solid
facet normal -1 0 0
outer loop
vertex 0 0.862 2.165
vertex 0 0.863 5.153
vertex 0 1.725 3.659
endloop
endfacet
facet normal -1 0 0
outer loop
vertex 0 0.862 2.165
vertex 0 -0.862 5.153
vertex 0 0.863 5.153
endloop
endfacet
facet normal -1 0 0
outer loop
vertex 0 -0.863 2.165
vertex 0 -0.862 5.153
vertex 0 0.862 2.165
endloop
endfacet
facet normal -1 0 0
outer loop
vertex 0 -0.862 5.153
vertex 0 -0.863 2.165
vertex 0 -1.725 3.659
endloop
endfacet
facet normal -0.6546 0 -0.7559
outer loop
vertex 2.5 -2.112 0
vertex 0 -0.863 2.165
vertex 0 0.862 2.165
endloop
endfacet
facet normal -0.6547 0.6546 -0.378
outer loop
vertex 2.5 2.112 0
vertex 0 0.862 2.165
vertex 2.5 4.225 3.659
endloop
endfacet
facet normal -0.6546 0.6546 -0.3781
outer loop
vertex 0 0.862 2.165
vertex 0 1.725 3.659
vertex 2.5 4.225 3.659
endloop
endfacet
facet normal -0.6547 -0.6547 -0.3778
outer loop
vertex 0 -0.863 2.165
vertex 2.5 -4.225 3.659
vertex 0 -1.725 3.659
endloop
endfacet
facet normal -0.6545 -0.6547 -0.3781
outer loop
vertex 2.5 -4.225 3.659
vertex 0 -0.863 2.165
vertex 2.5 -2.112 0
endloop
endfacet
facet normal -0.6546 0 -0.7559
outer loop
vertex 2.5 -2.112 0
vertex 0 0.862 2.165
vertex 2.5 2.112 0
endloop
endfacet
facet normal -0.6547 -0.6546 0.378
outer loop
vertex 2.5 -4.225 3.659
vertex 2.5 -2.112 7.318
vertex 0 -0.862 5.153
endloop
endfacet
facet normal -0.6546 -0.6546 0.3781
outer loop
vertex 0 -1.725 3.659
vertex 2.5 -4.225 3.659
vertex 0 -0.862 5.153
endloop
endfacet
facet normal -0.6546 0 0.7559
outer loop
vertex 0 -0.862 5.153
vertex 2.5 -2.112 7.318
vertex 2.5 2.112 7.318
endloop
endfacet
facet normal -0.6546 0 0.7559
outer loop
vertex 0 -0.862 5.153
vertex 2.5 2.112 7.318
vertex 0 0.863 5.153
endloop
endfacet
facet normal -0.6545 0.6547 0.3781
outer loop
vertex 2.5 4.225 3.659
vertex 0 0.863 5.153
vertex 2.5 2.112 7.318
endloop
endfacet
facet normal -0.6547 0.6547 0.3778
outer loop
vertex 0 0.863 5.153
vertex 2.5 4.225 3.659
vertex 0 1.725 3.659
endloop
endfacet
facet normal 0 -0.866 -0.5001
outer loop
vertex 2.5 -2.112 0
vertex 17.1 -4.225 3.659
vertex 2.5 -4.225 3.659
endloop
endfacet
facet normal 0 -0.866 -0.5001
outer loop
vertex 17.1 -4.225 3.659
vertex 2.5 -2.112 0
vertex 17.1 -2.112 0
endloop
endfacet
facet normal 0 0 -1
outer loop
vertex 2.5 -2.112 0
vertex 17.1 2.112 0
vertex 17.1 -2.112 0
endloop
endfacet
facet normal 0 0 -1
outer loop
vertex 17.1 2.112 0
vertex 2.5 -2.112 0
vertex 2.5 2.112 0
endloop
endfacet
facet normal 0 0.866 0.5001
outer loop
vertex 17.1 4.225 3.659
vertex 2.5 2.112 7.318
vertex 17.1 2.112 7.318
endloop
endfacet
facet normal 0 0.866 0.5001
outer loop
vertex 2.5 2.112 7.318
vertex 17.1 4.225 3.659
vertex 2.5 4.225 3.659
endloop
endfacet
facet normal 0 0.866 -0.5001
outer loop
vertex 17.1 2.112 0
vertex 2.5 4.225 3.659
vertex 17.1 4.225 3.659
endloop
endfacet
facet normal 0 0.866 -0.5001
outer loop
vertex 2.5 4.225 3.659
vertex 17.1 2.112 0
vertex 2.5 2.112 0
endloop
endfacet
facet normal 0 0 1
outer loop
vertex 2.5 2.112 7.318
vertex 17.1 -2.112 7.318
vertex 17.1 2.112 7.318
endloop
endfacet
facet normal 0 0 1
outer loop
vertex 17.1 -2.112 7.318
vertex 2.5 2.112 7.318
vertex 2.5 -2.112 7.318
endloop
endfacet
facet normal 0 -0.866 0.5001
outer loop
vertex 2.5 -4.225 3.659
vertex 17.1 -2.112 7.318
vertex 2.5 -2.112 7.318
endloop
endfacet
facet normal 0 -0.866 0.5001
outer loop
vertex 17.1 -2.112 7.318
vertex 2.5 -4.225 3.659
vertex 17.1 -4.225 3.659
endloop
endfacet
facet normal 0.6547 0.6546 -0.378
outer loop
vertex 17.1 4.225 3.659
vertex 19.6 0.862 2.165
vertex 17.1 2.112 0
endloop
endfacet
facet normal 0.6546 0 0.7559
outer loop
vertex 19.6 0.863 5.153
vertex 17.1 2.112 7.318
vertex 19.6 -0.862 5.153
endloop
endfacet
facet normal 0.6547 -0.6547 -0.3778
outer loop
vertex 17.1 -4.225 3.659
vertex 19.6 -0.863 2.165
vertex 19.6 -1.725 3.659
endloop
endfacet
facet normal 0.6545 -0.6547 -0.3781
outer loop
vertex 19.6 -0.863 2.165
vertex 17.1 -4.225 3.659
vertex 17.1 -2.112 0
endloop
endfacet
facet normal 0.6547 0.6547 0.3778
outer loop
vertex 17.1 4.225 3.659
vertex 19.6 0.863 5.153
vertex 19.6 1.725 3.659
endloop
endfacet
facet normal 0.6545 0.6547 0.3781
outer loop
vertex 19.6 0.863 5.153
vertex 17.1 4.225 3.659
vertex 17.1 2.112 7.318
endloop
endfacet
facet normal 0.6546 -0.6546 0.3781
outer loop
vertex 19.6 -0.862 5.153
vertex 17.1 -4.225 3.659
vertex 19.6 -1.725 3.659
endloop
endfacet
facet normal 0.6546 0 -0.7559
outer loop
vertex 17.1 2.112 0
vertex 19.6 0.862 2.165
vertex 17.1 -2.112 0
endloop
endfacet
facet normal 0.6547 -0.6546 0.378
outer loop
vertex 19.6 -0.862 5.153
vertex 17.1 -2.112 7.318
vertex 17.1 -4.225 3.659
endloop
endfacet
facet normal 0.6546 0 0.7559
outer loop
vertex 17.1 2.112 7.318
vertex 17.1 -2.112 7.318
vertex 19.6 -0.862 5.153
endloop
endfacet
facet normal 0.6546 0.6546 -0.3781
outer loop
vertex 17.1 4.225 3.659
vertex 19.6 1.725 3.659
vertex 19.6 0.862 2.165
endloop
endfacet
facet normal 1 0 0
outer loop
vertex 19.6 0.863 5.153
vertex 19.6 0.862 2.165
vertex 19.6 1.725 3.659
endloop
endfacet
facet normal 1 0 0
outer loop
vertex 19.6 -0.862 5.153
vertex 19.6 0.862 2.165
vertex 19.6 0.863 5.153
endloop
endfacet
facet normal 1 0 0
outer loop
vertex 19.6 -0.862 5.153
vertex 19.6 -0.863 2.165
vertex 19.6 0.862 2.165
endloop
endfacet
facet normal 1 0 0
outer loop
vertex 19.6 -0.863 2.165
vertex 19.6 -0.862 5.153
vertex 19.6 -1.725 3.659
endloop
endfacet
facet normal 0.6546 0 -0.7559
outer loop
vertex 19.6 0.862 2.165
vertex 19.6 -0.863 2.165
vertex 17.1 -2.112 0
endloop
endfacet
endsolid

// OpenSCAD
// peg.scad
// version: 0.5.0
// Prototype laid-down hex peg for vertical Hutchfinity casing stacks.

$fn = 64;
EPS = 0.01;

// Diameter is point-to-point across the hex. The default matches the current
// casing socket default: 8.0mm nominal peg + 0.45mm socket clearance.
PEG_DIAMETER = 8.45;
// Two nominal 10 mm receivers leave 0.4 mm total axial allowance.
PEG_LENGTH = 19.6;
PEG_END_CHAMFER = 2.5;
PEG_CORE_SIDES = 6;
PEG_PRINT_FACE_ROTATION = 30;

function peg_tip_diameter(diameter, chamfer) = max(0.8, diameter - 2 * chamfer);
function peg_flat_to_flat_diameter(diameter, core_sides) =
    diameter * cos(180 / core_sides);

module chamfered_peg_core(diameter, length, chamfer, core_sides) {
    tip_d = peg_tip_diameter(diameter, chamfer);

    union() {
        cylinder(d1=tip_d, d2=diameter, h=chamfer, $fn=core_sides);
        translate([0, 0, chamfer])
            cylinder(d=diameter, h=max(EPS, length - 2 * chamfer), $fn=core_sides);
        translate([0, 0, length - chamfer])
            cylinder(d1=diameter, d2=tip_d, h=chamfer, $fn=core_sides);
    }
}

module hutchfinity_peg(
    diameter=PEG_DIAMETER,
    length=PEG_LENGTH,
    end_chamfer=PEG_END_CHAMFER,
    core_sides=PEG_CORE_SIDES
) {
    chamfer = min(end_chamfer, length / 2 - EPS);

    assert(diameter > 0 && length > 0, "peg diameter and length must be positive");
    assert(end_chamfer >= 0, "peg end chamfer must be non-negative");
    assert(core_sides >= 3, "peg core needs at least three sides");

    chamfered_peg_core(diameter, length, chamfer, core_sides);
}

module hutchfinity_peg_print_layout(
    diameter=PEG_DIAMETER,
    length=PEG_LENGTH,
    end_chamfer=PEG_END_CHAMFER,
    core_sides=PEG_CORE_SIDES,
    print_face_rotation=PEG_PRINT_FACE_ROTATION
) {
    translate([0, 0, peg_flat_to_flat_diameter(diameter, core_sides) / 2])
        rotate([0, 90, 0])
            rotate([0, 0, print_face_rotation])
                hutchfinity_peg(
                    diameter=diameter,
                    length=length,
                    end_chamfer=end_chamfer,
                    core_sides=core_sides
                );
}

hutchfinity_peg_print_layout();
